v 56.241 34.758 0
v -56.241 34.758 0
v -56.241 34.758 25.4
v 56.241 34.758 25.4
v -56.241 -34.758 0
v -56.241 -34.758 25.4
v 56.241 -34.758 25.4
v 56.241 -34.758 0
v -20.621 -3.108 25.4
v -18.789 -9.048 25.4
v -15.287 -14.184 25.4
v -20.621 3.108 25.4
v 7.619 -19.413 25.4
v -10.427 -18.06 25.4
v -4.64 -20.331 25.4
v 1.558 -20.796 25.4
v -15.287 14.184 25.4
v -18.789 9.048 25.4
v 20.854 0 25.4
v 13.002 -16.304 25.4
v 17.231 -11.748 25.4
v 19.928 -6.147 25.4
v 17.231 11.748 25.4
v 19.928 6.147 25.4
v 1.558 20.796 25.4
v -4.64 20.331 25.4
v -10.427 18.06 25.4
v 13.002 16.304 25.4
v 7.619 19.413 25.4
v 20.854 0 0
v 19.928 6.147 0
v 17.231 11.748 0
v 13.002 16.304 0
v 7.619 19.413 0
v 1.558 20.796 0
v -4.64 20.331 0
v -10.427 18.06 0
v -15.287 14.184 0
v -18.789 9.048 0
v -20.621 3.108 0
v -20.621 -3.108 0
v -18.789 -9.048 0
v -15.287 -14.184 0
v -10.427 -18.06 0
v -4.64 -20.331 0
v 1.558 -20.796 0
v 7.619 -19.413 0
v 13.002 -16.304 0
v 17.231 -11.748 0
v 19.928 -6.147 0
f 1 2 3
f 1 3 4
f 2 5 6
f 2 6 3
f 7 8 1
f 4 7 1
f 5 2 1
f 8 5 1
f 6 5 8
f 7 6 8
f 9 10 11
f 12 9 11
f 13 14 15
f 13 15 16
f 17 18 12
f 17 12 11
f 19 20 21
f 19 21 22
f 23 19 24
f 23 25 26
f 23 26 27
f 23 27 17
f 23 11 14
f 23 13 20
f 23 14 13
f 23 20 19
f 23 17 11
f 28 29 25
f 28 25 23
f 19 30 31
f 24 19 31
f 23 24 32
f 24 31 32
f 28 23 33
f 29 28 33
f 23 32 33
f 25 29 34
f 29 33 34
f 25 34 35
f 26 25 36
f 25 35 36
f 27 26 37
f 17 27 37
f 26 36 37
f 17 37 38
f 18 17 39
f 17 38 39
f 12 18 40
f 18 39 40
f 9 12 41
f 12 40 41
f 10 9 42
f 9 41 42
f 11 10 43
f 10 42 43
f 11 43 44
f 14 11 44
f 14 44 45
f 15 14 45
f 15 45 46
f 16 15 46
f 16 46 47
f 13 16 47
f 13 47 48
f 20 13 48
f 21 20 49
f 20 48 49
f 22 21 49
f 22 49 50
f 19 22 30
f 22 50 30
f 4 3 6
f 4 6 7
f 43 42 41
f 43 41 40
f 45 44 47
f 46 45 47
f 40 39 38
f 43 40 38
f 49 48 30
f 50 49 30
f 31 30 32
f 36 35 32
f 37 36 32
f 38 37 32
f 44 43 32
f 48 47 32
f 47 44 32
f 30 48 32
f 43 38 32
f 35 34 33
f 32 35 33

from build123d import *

# Parameters (mm, degrees)
F0_W     = 112.4813705683
F0_H     = 69.5165470243
F2_DEPTH = 25.4
F1_R     = 20.8541710189


with BuildPart() as f2:
    # F0 (on Top) → F2 (new body)
    with BuildSketch(Plane.XY):
        Rectangle(F0_W, F0_H)
    extrude(amount=F2_DEPTH)


with BuildPart() as f2b:
    # F1 (on Top) → F2, piece 2 (new body)
    with BuildSketch(Plane.XY):
        Circle(F1_R)
    extrude(amount=F2_DEPTH)


solid = Compound([f2.part, f2b.part])
